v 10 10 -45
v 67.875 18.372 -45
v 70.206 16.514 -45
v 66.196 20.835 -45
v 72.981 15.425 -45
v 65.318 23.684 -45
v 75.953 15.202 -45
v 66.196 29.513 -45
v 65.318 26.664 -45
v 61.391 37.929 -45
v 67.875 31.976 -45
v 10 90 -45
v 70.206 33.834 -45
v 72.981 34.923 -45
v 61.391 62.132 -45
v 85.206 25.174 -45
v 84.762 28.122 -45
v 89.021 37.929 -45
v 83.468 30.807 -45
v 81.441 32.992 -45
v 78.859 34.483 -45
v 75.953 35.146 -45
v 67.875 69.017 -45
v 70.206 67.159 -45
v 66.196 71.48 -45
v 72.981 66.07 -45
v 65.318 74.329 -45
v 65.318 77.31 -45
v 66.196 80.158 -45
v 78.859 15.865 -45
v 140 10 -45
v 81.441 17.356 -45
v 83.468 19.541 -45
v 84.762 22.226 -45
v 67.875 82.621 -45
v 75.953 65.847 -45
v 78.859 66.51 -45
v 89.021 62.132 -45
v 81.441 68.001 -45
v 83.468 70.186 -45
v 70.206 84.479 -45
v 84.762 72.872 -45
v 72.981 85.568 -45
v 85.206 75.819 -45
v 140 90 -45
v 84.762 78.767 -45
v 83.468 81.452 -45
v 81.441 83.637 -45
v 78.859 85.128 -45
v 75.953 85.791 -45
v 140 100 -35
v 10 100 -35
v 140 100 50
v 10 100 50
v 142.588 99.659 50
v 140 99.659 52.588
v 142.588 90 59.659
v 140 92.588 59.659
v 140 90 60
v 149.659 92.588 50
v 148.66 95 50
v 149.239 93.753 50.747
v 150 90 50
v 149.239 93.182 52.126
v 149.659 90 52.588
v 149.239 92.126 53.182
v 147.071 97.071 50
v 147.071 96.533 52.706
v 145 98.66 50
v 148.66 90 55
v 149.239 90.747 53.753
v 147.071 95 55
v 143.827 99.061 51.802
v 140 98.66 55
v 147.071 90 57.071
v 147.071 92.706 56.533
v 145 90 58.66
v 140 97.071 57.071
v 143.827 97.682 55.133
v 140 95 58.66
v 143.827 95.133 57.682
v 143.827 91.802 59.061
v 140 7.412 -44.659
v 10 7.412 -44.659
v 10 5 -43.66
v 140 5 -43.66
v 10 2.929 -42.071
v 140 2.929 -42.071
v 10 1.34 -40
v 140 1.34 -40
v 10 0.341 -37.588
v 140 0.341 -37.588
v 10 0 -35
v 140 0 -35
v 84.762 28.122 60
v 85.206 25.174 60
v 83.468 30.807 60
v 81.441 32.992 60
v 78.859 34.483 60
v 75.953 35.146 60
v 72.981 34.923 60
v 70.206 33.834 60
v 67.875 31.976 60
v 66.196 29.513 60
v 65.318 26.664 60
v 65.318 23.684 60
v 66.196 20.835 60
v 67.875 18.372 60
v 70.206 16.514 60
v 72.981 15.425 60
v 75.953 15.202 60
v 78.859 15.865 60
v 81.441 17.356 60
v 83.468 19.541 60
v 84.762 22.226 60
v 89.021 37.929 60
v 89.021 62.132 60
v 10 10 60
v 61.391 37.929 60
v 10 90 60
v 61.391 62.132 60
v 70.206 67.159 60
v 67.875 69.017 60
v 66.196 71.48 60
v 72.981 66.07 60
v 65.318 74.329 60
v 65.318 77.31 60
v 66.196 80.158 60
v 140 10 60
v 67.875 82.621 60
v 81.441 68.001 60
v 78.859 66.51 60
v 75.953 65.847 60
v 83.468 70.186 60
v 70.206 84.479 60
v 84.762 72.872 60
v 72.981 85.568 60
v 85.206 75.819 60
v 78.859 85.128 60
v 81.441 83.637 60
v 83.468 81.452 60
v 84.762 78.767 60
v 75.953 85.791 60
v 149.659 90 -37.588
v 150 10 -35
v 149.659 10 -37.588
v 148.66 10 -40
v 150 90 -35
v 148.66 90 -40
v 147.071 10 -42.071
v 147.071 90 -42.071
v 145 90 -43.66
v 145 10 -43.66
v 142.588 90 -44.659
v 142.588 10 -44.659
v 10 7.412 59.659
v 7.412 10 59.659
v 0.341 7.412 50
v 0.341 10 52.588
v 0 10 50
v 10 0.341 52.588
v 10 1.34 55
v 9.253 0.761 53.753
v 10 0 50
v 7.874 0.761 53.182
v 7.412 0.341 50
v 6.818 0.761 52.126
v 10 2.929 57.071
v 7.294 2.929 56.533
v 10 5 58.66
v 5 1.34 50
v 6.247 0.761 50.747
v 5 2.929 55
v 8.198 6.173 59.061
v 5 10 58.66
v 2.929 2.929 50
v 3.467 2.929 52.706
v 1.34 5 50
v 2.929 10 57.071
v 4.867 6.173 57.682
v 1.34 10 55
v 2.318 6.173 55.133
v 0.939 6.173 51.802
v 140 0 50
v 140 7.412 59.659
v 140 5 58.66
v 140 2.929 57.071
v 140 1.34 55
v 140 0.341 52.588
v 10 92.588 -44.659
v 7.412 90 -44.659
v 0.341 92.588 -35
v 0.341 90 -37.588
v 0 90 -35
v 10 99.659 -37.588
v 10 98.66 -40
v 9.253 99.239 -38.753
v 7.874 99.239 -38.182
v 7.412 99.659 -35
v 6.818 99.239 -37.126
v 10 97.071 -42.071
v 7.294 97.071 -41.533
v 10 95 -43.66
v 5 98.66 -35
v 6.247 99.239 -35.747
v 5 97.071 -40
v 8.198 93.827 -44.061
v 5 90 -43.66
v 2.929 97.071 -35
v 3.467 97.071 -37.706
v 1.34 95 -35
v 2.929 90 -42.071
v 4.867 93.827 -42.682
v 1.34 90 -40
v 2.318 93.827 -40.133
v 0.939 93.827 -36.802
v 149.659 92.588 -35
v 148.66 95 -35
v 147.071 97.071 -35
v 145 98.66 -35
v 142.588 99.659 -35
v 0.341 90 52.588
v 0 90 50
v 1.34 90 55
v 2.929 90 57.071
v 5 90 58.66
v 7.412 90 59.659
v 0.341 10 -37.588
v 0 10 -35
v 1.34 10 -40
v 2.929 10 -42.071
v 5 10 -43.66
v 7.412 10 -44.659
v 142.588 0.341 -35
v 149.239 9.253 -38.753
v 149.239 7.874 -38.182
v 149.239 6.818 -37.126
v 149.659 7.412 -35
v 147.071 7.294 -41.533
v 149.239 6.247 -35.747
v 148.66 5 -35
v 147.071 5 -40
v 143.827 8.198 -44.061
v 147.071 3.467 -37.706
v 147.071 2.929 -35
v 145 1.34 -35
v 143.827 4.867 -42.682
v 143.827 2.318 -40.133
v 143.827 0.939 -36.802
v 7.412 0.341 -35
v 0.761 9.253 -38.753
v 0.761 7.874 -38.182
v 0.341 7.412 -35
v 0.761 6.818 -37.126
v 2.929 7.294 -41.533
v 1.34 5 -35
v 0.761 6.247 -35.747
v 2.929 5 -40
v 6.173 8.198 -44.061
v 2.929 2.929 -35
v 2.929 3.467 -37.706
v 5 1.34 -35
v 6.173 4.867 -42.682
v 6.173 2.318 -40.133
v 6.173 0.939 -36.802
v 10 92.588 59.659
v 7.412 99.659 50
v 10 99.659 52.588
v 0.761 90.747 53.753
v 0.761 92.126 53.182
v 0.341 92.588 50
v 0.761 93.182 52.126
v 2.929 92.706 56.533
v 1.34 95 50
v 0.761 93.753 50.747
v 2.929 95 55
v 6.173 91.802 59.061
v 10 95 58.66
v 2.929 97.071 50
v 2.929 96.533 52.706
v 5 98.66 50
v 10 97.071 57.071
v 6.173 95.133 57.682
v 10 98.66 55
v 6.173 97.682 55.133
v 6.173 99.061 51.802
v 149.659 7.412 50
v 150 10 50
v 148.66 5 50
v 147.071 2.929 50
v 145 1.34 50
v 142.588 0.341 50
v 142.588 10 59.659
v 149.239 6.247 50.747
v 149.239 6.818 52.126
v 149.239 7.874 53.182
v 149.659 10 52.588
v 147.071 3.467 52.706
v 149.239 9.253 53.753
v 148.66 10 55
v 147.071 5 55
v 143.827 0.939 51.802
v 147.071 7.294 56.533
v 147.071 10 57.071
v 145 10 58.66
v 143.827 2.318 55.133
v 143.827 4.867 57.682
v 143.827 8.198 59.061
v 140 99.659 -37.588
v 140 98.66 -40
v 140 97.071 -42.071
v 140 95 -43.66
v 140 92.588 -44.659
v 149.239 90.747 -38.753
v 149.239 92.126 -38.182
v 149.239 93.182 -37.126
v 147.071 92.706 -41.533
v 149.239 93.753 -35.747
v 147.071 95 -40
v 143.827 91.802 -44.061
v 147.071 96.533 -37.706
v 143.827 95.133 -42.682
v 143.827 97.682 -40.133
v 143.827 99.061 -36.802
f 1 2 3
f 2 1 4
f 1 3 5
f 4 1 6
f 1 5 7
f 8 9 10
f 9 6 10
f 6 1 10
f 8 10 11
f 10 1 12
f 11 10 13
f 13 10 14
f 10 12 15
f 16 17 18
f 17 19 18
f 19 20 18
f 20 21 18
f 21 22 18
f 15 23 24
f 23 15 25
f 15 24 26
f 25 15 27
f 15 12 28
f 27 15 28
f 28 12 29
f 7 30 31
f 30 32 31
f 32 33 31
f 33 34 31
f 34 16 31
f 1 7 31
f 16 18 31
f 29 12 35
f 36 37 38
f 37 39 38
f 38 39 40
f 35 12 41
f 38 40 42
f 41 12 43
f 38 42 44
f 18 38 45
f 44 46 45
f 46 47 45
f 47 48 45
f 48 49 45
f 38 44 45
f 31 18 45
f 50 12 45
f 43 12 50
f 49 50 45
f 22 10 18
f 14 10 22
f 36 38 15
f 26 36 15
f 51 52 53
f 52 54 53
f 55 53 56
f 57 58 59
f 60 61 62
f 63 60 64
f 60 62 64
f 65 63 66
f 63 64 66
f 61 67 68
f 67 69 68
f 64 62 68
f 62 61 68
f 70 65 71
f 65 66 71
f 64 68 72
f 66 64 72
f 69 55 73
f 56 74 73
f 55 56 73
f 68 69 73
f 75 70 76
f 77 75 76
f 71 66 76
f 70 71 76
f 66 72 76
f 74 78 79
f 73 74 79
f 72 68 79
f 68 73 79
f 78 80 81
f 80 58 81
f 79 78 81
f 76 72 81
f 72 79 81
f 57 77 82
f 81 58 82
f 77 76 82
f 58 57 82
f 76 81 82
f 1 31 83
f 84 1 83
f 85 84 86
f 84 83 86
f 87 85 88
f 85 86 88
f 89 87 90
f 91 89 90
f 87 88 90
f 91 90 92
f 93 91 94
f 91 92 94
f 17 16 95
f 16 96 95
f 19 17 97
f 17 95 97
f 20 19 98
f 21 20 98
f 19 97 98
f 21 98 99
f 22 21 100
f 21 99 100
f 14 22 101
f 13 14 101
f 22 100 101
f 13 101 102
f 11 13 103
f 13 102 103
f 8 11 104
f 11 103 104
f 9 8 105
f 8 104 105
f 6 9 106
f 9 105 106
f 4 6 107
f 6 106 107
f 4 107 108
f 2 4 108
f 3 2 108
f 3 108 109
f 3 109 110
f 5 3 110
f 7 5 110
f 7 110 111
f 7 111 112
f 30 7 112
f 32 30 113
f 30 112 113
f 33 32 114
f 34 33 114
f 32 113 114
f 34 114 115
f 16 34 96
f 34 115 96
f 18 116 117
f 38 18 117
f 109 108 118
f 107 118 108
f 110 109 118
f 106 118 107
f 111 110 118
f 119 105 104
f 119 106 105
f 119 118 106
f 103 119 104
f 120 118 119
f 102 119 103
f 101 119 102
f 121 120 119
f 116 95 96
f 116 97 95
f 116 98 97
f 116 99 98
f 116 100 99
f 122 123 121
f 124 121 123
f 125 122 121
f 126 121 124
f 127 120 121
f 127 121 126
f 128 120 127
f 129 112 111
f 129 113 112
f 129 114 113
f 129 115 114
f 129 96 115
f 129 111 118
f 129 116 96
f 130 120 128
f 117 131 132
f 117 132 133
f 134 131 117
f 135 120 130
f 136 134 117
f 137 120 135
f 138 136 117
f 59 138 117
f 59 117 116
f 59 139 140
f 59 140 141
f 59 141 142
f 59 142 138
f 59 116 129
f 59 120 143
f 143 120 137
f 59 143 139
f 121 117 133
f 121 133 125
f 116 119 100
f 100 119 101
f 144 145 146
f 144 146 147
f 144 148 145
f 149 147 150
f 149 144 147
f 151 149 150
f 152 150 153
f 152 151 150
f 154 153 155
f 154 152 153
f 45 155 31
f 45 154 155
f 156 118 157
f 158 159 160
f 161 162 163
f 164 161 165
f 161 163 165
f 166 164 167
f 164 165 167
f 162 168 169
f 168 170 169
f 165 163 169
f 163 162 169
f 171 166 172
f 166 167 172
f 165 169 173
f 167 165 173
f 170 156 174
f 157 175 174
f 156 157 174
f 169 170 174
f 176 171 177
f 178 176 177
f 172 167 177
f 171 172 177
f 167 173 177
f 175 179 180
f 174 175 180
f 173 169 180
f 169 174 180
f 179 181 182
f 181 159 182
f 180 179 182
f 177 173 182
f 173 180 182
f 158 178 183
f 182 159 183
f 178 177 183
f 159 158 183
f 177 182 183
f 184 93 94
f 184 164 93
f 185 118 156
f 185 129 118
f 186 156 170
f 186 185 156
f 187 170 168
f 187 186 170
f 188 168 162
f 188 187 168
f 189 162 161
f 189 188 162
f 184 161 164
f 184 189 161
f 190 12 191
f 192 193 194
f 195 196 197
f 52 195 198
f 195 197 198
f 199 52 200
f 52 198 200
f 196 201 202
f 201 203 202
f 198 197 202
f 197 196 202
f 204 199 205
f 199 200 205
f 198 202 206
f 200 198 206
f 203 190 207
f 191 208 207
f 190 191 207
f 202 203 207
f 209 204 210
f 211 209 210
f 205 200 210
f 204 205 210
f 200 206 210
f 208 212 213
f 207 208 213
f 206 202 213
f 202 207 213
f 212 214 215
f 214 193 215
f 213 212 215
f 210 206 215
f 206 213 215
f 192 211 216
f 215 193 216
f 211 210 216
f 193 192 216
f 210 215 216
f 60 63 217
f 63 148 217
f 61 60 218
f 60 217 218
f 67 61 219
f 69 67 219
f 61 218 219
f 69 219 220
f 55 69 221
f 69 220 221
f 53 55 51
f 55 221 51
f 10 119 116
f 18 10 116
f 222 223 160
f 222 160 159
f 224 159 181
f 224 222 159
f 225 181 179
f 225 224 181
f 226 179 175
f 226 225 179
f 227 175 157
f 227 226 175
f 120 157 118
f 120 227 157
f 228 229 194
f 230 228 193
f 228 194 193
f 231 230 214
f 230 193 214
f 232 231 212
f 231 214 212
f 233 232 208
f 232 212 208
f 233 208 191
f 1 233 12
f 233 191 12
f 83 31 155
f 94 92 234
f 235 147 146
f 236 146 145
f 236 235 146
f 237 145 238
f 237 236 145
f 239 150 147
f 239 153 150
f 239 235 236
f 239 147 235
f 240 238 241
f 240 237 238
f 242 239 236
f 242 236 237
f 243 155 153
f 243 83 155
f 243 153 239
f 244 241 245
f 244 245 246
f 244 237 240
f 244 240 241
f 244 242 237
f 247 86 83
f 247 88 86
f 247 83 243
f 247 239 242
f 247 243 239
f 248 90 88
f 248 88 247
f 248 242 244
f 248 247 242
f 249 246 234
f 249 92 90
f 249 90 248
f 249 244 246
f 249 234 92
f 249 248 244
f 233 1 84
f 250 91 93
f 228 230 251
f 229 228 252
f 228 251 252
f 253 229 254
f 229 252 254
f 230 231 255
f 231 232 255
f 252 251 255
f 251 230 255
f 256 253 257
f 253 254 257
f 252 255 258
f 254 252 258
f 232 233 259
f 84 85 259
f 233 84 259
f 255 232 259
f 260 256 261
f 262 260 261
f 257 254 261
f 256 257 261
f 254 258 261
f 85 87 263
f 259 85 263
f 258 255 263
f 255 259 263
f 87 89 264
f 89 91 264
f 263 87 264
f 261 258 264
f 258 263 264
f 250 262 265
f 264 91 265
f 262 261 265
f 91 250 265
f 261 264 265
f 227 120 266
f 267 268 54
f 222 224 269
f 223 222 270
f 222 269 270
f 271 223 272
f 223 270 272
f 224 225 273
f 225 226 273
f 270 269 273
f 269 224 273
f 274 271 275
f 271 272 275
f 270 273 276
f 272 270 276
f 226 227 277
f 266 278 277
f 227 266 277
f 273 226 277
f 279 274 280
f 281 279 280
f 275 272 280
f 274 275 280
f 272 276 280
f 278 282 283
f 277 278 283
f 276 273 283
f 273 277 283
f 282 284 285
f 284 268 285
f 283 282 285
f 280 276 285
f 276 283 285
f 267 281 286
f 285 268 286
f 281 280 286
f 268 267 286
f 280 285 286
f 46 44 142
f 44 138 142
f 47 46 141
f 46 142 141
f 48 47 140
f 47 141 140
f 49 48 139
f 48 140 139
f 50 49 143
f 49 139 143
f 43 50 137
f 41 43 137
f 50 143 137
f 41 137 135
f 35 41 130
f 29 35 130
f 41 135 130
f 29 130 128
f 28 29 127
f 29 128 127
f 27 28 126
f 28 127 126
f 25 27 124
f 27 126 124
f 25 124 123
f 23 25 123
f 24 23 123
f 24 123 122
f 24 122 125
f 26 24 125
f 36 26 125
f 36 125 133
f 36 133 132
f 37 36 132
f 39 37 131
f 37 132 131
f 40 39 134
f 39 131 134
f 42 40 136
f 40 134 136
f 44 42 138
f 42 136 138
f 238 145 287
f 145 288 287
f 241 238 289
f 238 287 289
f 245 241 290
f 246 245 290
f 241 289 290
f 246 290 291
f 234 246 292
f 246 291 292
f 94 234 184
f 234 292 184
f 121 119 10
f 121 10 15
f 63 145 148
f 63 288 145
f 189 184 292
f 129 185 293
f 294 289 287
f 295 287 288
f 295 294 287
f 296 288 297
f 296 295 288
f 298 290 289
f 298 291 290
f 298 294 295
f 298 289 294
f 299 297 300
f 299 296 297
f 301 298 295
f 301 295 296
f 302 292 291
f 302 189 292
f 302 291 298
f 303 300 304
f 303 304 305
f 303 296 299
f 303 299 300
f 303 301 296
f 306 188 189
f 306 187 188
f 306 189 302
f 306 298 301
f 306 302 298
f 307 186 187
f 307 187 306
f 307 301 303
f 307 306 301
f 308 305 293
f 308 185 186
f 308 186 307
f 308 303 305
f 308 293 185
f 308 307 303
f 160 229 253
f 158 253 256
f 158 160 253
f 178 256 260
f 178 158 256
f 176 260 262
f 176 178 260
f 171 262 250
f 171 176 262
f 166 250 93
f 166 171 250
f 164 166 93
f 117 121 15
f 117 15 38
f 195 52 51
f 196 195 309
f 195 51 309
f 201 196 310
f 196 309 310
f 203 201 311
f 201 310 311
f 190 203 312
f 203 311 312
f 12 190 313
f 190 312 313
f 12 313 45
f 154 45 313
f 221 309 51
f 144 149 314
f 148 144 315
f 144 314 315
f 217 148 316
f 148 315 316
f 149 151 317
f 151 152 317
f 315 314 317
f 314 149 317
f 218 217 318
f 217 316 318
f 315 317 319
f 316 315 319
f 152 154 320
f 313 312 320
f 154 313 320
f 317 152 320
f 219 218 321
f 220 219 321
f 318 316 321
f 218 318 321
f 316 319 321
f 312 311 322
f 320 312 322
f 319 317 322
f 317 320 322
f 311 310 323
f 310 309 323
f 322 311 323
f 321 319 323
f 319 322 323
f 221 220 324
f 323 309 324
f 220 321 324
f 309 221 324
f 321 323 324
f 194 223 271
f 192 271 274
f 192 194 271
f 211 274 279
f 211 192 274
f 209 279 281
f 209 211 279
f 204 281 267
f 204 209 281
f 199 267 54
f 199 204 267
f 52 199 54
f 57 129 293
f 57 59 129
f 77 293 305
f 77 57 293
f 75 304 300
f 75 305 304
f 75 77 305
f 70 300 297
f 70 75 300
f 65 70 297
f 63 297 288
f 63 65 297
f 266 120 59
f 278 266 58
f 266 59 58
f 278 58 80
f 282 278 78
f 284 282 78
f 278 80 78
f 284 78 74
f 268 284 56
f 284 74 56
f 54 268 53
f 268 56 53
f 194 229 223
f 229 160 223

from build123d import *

# Parameters (mm, degrees)
SKETCH1_W                = 150
SKETCH1_H                = 100
BOSS_EXTRUDE1_DEPTH      = 60
BOSS_EXTRUDE1_DEPTH_BACK = 45
SKETCH5_W                = 27.629917719
SKETCH5_H                = 24.20295118
CUT_EXTRUDE1_DEPTH       = 79
CUT_EXTRUDE1_DEPTH_BACK  = 83
FILLET1_R                = 10
SKETCH7_R                = 10
CUT_EXTRUDE2_DEPTH       = 125


with BuildPart() as part:
    # Sketch1 → Boss-Extrude1 (new body, two sides)
    with BuildSketch(Plane.XY) as boss_extrude1_sk:
        with Locations((75, 50)):
            Rectangle(SKETCH1_W, SKETCH1_H)
    extrude(amount=BOSS_EXTRUDE1_DEPTH)
    extrude(boss_extrude1_sk.sketch, amount=-BOSS_EXTRUDE1_DEPTH_BACK)

    # Sketch5 → Cut-Extrude1 (cut, two sides)
    with BuildSketch(Plane(origin=(42.452521569, 36, 0), x_dir=(1, 0, 0), z_dir=(0, 0, 1))) as cut_extrude1_sk:
        with Locations((32.75337542, 14.030268891)):
            Rectangle(SKETCH5_W, SKETCH5_H)
    extrude(amount=CUT_EXTRUDE1_DEPTH, mode=Mode.SUBTRACT)
    extrude(cut_extrude1_sk.sketch, amount=-CUT_EXTRUDE1_DEPTH_BACK, mode=Mode.SUBTRACT)

    # Fillet1
    fillet1_edges = [part.edges().sort_by_distance(p)[0] for p in [
        (75, 0, -45),
        (0, 50, -45),
        (75, 100, -45),
        (150, 50, -45),
        (75, 100, 60),
        (0, 50, 60),
        (75, 0, 60),
        (0, 0, 7.5),
        (0, 100, 7.5),
        (150, 100, 7.5),
        (150, 0, 7.5),
        (150, 50, 60),
    ]]
    fillet(fillet1_edges, radius=FILLET1_R)

    # Sketch7 → Cut-Extrude2 (cut, symmetric)
    with BuildSketch(Plane.XY):
        with Locations((75.20589699, 75.819077446)):
            Circle(SKETCH7_R)
        with Locations((75.20589699, 25.173963995)):
            Circle(SKETCH7_R)
    extrude(amount=CUT_EXTRUDE2_DEPTH, both=True, mode=Mode.SUBTRACT)


solid = part.part
